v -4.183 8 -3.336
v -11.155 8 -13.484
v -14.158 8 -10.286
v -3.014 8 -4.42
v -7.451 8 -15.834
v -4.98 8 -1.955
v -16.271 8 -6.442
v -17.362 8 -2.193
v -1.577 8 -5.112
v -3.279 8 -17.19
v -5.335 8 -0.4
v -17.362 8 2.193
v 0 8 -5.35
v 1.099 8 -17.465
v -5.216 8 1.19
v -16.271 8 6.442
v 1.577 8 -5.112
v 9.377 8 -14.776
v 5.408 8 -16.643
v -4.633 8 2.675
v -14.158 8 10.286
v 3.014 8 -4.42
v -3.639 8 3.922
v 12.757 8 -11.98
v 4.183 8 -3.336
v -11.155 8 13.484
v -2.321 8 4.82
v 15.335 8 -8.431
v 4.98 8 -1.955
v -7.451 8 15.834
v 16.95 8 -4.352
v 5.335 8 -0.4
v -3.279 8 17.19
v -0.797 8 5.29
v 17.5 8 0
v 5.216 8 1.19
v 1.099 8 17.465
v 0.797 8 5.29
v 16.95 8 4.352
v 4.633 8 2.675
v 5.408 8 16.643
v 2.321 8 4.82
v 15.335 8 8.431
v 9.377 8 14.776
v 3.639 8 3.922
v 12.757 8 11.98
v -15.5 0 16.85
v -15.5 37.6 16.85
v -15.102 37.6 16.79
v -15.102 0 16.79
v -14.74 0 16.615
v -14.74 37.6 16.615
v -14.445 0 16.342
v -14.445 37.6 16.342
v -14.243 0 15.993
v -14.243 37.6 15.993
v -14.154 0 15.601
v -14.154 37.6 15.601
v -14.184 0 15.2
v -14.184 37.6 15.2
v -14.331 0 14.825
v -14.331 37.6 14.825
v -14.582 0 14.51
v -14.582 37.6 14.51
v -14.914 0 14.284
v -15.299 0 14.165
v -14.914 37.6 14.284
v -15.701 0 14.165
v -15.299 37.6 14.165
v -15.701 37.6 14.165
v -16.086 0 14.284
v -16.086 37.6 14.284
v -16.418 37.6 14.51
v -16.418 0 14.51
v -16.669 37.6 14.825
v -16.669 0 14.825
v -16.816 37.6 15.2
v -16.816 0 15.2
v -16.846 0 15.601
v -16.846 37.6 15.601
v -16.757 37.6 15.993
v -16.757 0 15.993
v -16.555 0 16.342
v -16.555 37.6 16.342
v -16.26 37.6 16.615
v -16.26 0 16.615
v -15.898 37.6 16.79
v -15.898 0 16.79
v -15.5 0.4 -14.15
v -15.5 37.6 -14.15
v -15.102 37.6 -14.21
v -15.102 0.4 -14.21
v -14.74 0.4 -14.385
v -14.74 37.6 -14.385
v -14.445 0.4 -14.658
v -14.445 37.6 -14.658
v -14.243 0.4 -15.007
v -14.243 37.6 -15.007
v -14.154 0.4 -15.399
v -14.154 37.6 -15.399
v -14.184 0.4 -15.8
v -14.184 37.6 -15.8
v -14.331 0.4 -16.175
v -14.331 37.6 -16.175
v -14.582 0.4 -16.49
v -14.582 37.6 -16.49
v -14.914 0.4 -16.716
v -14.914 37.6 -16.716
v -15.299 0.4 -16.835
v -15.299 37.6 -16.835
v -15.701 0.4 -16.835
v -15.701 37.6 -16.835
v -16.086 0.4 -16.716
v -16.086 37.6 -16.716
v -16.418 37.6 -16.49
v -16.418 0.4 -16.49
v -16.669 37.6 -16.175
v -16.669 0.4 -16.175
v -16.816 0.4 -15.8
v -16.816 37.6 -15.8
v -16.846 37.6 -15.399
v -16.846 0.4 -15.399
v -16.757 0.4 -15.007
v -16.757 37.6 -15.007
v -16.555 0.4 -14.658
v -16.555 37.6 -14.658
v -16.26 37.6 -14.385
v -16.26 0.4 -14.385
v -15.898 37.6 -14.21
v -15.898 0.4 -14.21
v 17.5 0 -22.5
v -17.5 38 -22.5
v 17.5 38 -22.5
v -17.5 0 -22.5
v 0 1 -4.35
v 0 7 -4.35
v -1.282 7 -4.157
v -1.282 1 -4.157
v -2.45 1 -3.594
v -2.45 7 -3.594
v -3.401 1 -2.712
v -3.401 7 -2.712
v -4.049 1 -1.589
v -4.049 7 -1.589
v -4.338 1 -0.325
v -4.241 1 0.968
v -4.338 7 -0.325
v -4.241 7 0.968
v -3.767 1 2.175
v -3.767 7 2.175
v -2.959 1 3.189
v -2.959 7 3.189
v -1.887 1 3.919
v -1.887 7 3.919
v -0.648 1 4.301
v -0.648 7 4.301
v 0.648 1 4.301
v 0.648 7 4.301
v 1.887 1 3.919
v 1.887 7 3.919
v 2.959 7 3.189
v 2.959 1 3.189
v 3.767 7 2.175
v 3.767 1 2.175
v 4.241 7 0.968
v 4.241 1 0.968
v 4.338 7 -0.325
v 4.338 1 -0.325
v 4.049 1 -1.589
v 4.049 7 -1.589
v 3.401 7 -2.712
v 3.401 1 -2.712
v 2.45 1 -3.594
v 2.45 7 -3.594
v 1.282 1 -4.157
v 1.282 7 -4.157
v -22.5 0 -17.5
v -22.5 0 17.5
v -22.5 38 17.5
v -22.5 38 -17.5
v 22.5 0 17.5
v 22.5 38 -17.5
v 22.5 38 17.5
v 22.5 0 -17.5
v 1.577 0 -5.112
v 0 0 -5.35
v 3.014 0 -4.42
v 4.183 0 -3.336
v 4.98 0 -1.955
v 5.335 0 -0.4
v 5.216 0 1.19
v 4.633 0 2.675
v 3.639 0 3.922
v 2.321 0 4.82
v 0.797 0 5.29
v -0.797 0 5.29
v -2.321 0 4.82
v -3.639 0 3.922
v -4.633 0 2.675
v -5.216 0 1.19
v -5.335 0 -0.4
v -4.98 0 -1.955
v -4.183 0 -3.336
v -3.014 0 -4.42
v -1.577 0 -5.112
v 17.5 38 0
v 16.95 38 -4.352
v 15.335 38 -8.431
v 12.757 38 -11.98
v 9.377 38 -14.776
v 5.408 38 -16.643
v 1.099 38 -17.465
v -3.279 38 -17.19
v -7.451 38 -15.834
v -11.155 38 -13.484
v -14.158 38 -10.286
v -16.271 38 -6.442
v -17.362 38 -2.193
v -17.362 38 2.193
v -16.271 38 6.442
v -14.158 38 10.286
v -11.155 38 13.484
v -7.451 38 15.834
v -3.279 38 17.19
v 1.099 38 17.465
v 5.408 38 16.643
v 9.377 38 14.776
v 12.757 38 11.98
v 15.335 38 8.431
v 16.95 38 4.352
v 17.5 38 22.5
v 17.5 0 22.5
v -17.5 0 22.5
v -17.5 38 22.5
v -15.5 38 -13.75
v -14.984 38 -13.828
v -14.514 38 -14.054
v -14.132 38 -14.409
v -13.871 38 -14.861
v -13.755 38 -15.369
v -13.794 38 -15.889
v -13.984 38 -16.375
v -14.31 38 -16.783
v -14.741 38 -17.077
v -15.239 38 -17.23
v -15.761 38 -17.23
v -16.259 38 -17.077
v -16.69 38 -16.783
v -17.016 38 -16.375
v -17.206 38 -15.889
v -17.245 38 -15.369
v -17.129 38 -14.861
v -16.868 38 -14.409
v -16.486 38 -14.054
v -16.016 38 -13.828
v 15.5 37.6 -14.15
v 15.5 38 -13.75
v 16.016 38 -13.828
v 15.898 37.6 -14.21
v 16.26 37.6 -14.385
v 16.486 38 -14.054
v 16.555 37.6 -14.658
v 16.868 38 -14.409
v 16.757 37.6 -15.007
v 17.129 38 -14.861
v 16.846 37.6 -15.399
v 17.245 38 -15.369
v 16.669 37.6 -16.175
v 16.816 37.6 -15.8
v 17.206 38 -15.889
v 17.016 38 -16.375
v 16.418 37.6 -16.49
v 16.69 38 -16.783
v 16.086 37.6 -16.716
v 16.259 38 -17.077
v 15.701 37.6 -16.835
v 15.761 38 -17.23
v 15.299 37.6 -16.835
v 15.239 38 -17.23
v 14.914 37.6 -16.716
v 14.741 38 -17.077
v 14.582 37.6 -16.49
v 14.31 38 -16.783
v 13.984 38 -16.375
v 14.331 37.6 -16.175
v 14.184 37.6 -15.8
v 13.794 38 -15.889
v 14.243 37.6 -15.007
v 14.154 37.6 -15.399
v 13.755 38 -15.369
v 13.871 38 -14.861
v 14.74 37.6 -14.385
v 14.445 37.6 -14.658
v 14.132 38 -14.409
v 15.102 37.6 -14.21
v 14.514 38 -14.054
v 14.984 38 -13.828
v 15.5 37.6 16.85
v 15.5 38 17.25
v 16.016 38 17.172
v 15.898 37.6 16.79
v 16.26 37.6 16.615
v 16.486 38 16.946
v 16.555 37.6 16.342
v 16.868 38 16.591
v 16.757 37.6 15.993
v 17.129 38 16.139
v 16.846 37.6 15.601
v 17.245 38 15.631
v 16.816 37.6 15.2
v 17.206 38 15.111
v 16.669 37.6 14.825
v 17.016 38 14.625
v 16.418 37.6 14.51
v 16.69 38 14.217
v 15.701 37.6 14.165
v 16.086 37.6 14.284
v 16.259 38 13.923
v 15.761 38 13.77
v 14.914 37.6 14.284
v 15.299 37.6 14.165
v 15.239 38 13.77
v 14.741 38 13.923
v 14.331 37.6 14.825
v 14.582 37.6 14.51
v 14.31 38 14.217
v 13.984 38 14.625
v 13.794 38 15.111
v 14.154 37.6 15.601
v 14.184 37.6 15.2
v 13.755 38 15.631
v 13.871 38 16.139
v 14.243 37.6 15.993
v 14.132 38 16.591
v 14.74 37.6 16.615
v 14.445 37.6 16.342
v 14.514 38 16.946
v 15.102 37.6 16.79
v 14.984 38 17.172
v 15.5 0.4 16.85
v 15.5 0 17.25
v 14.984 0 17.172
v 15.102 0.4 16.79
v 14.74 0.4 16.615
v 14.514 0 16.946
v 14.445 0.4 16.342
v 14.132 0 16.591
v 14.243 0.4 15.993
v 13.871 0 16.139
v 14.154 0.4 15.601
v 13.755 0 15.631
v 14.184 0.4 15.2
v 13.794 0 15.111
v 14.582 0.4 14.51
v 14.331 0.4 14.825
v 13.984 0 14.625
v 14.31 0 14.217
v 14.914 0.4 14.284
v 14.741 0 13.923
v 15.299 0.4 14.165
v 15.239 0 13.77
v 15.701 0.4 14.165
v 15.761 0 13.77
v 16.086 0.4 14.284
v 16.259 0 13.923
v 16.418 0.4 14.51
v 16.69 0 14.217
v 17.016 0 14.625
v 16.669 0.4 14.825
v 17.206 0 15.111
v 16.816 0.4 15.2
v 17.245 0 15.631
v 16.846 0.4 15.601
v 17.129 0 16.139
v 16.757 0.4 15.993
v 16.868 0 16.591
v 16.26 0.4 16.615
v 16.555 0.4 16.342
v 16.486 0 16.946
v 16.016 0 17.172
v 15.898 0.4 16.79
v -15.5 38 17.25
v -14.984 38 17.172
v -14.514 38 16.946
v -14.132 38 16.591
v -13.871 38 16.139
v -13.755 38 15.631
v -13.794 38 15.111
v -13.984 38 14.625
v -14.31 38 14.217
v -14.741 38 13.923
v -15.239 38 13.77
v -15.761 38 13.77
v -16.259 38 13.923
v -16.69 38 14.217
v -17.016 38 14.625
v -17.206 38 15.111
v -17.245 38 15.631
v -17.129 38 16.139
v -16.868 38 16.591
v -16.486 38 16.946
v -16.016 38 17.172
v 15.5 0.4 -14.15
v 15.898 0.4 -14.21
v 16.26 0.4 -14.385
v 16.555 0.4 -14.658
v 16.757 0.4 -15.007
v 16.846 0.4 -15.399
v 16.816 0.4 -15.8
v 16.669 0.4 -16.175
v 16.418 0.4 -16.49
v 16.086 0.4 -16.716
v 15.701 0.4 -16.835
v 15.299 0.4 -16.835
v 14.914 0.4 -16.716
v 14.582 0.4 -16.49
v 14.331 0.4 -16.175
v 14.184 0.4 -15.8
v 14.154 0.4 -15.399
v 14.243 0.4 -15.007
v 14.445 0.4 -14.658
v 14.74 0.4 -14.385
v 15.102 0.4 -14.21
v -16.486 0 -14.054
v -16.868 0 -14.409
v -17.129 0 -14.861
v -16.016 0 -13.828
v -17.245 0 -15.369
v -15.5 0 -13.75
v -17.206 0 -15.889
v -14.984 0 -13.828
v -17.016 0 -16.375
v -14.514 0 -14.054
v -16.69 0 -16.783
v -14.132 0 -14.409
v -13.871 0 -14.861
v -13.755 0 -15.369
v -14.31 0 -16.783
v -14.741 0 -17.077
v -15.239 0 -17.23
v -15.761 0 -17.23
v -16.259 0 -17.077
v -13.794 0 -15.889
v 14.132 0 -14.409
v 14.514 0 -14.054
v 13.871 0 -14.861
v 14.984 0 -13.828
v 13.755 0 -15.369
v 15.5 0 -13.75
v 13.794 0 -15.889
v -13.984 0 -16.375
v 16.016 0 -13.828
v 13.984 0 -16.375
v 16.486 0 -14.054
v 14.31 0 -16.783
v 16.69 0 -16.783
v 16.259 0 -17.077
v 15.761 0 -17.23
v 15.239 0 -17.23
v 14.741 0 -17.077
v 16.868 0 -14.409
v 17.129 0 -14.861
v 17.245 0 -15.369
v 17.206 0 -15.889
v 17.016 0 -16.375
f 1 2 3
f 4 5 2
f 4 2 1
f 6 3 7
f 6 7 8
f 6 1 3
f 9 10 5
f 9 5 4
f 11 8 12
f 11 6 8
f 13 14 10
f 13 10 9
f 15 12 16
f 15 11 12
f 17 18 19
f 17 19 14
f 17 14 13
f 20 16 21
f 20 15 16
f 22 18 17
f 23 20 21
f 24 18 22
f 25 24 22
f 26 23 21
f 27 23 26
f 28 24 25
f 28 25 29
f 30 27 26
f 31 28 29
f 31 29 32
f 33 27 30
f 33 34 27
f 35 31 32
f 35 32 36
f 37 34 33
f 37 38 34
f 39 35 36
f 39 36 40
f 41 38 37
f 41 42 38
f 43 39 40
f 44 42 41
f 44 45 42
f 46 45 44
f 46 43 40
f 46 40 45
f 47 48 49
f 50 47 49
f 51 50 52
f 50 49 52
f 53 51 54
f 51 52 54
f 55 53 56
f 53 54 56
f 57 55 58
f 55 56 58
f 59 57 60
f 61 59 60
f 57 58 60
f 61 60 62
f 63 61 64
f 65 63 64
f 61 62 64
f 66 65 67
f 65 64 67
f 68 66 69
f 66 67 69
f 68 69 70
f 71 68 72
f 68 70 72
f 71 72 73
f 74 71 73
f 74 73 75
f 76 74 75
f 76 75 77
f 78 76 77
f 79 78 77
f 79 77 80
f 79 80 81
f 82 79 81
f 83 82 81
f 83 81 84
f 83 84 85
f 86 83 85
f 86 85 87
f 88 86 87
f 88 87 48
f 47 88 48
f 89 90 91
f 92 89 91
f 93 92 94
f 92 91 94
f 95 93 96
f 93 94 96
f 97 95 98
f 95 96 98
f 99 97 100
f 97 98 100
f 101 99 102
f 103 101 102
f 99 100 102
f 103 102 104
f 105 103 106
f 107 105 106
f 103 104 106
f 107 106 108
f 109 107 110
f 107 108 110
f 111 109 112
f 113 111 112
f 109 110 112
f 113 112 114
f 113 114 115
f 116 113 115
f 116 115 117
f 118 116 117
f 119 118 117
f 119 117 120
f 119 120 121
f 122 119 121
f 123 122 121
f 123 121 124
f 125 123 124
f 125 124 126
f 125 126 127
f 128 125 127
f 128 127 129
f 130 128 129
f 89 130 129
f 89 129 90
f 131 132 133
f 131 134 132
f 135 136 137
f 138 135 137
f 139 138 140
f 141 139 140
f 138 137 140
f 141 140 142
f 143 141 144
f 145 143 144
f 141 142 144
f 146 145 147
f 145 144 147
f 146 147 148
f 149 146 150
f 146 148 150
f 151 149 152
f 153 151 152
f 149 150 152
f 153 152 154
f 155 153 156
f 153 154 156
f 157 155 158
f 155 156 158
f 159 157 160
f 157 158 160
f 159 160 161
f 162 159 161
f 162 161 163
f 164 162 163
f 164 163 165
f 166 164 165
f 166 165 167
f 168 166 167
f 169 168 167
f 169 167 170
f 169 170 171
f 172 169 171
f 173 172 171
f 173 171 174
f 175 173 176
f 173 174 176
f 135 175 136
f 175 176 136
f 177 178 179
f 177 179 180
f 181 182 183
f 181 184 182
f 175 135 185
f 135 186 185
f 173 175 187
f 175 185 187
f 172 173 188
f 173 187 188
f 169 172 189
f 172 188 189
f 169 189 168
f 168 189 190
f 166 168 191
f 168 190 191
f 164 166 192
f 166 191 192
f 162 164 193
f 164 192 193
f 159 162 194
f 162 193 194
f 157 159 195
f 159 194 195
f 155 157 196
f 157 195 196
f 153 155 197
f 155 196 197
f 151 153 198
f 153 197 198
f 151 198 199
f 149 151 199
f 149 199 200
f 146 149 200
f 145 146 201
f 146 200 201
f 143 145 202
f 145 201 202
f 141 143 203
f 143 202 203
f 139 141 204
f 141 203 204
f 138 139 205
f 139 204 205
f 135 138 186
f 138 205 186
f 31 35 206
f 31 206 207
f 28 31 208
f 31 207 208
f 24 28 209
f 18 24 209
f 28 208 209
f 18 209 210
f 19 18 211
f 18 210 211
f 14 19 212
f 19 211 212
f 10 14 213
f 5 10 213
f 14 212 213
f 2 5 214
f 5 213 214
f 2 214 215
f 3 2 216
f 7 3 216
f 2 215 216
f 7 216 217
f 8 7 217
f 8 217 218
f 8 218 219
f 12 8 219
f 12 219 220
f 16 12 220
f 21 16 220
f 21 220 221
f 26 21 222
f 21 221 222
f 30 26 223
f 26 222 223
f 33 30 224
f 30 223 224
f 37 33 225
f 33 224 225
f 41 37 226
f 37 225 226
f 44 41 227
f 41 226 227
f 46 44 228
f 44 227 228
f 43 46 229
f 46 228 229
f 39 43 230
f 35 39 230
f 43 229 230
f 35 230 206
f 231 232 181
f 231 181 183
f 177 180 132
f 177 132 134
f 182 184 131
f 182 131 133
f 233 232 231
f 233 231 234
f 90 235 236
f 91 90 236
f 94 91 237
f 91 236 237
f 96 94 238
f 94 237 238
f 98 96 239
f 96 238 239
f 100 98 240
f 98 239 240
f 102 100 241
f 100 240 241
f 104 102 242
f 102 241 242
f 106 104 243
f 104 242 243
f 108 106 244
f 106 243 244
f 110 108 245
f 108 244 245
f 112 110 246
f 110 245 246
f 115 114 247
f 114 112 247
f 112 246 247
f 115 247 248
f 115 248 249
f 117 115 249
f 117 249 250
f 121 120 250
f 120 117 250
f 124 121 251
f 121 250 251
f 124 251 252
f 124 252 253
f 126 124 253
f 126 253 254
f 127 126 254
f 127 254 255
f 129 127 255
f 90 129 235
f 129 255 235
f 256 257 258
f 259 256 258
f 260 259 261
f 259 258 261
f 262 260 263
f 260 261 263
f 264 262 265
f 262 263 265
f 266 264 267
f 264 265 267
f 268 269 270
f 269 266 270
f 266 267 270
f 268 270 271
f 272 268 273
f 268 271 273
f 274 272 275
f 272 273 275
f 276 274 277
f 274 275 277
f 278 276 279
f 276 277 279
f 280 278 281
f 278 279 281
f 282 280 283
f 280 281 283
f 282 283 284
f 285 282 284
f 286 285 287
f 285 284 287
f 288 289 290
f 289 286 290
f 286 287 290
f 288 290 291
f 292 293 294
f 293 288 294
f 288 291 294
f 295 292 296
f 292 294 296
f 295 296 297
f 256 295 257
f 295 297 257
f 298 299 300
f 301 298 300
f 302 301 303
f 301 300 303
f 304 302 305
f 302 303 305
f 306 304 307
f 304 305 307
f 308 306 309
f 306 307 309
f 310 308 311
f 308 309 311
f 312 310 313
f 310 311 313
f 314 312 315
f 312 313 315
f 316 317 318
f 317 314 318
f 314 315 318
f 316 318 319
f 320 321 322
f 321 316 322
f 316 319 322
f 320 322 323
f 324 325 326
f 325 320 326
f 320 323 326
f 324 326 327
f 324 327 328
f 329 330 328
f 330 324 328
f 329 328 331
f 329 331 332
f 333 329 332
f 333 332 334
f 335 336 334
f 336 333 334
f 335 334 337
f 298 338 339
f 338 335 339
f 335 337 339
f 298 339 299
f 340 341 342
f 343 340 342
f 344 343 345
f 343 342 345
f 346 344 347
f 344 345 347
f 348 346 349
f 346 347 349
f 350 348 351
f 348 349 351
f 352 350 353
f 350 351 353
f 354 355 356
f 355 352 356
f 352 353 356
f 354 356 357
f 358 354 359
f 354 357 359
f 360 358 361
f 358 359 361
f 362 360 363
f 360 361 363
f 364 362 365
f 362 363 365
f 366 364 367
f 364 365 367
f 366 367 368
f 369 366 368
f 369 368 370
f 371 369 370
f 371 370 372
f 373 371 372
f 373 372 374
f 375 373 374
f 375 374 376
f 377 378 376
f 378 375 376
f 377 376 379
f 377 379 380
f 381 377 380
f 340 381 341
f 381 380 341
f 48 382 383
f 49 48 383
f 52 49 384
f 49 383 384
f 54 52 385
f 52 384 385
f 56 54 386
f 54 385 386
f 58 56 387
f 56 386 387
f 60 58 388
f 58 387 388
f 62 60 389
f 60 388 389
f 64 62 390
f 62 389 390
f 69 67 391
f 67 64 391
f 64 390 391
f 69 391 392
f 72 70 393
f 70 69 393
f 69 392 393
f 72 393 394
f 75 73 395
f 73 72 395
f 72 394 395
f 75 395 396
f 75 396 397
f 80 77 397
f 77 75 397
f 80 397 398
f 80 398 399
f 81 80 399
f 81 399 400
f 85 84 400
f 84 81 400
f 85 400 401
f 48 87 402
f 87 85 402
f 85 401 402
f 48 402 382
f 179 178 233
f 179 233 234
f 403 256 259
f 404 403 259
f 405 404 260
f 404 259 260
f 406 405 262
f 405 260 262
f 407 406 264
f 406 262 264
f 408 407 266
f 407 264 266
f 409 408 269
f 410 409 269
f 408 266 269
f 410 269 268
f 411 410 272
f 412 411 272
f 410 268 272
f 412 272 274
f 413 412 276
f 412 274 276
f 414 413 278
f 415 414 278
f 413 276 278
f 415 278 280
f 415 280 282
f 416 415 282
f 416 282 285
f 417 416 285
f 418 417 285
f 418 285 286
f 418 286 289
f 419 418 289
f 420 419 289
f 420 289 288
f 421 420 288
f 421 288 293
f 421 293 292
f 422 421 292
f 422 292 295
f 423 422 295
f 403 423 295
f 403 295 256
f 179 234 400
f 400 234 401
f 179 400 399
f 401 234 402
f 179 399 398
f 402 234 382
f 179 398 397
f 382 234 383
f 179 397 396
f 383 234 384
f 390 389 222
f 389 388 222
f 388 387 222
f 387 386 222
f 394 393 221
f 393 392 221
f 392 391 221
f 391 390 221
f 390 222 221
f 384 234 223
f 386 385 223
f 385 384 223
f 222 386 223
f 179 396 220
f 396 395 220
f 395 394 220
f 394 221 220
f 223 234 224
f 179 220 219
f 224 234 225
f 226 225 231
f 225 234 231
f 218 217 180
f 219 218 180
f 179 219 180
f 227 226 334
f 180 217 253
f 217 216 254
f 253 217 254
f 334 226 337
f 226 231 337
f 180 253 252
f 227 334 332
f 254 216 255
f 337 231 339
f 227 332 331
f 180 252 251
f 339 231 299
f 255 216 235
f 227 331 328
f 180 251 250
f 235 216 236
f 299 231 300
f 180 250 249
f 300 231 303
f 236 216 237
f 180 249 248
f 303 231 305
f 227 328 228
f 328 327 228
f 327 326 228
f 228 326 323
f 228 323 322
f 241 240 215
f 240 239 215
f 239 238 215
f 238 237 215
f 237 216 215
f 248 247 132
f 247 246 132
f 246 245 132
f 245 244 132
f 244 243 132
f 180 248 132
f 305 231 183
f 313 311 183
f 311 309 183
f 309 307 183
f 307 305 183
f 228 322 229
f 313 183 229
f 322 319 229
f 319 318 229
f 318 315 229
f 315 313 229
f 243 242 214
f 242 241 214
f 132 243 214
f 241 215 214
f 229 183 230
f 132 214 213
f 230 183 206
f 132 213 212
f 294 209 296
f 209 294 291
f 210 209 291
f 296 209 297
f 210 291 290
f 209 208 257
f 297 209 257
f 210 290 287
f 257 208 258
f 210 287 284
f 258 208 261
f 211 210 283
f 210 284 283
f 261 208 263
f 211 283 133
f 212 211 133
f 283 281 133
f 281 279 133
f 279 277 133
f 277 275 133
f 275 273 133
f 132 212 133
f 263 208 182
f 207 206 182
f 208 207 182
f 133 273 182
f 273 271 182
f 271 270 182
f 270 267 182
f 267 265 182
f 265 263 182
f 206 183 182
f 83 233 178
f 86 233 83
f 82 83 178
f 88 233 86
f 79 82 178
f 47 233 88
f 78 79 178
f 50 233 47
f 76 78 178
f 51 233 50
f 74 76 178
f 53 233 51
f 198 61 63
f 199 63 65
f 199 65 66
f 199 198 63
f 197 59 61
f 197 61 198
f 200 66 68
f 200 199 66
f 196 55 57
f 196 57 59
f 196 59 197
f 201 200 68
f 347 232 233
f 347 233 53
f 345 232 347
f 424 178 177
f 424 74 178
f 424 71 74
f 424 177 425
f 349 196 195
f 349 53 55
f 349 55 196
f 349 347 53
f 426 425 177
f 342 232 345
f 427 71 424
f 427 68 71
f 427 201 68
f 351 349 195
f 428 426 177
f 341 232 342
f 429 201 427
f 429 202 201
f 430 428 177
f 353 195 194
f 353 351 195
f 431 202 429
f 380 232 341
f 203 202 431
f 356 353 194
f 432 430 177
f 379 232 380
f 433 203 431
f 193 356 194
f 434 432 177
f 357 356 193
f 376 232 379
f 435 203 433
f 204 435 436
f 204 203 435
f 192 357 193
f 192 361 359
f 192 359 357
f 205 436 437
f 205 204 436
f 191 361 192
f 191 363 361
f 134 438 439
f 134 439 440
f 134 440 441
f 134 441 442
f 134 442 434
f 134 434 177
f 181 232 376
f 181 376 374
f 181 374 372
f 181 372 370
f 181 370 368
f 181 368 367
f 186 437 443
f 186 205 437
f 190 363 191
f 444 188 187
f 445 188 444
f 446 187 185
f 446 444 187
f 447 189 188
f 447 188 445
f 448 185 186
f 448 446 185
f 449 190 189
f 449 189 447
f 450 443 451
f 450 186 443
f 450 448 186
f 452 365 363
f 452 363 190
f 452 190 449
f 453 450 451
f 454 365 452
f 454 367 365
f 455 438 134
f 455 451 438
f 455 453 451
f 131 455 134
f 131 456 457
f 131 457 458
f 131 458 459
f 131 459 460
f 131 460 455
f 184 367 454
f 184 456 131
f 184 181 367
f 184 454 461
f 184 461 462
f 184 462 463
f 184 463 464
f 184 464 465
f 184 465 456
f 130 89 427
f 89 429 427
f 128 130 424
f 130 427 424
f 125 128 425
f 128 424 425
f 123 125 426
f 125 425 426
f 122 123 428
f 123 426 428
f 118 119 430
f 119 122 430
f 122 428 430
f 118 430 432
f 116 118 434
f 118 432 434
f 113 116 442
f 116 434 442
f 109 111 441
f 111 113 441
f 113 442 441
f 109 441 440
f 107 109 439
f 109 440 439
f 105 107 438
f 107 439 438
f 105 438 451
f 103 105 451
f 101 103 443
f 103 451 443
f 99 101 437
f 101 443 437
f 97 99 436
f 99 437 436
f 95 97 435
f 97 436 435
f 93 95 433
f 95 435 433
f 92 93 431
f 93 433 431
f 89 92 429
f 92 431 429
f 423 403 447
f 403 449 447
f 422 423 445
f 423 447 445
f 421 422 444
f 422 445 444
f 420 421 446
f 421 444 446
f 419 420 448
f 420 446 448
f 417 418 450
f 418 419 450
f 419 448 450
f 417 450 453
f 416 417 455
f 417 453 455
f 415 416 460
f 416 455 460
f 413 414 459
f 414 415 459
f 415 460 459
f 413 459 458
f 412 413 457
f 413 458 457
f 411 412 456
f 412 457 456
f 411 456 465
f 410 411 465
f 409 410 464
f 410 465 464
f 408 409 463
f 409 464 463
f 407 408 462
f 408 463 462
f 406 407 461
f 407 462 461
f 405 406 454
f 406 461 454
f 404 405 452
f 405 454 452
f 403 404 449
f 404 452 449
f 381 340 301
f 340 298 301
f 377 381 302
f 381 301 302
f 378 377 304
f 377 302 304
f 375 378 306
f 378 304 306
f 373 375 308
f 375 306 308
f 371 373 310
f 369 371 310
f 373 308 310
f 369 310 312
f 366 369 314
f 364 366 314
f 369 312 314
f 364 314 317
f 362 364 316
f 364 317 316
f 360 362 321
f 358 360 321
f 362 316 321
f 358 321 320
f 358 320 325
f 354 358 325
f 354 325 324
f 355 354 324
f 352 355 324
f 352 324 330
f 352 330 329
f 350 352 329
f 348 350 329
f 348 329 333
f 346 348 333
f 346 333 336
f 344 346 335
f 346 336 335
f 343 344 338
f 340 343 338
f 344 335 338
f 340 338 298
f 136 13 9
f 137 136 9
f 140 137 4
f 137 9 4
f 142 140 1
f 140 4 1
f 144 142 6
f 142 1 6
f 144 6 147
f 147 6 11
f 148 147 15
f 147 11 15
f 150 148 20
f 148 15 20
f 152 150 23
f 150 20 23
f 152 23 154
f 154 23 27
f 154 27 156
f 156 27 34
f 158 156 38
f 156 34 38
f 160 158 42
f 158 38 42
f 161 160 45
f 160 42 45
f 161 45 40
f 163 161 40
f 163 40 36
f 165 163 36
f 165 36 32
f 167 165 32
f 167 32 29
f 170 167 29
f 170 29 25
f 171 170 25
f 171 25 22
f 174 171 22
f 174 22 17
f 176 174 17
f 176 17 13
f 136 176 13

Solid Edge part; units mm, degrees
sketch "Sketch1" plane through (0, 0, 0) normal (0, -1, 0) x (1, 0, 0)
  line L0 (-22.5, -22.5) -> (22.5, -22.5)
  line L1 (22.5, -22.5) -> (22.5, 22.5)
  line L2 (22.5, 22.5) -> (-22.5, 22.5)
  line L3 (-22.5, 22.5) -> (-22.5, -22.5)
  dimension "D1" = 45
extrude "Protrusion1" add sketch "Sketch1" against normal blind 38
chamfer "Chamfer_1" distance 5 angle 45 4 edges at (22.5, 19, 22.5) (22.5, 19, -22.5) (-22.5, 19, 22.5) (-22.5, 19, -22.5)
hole "Hole1" at (-15.5, 38, 15.5) direction (0, -1, 0) diameter 2.7 end up to next
hole "Hole2" at (-15.5, 38, -15.5) direction (0, -1, 0) diameter 2.7 end up to next
hole "Hole3" at (15.5, 38, -15.5) direction (0, -1, 0) diameter 2.7 end up to next
hole "Hole4" at (15.5, 38, 15.5) direction (0, -1, 0) diameter 2.7 end up to next
sketch "Sketch2" plane through (0, 38, 0) normal (0, 1, 0) x (0, 0, -1)
  circle A0 centre (0, 0) radius 4.35
  dimension "D1" = 8.7
extrude "Cutout1" cut sketch "Sketch2" against normal up to next
chamfer "Chamfer1" distance 1 angle 45 1 edges at (0, 38, 4.35)
chamfer "Fase_3" distance 1 angle 45 1 edges at (0, 0, 4.35)
chamfer "Fase_5" distance 0.4 angle 45 7 edges at (-15.5, 38, -14.15) (-15.5, 38, 16.85) (15.5, 38, -14.15) (15.5, 38, 16.85) (15.5, 0, 16.85) (15.5, 0, -14.15) (-15.5, 0, -14.15)
sketch "Sketch3" plane through (0, 38, 0) normal (0, 1, 0) x (1, 0, 0)
  circle A0 centre (0, 0) radius 17.5
  dimension "D1" = 35
extrude "Extrusionsausschnitt_2" cut sketch "Sketch3" against normal blind 30
chamfer "Fase_6" distance 1 angle 45 1 edges at (0, 8, 4.35)
properties material "Nylon, allgemein"
